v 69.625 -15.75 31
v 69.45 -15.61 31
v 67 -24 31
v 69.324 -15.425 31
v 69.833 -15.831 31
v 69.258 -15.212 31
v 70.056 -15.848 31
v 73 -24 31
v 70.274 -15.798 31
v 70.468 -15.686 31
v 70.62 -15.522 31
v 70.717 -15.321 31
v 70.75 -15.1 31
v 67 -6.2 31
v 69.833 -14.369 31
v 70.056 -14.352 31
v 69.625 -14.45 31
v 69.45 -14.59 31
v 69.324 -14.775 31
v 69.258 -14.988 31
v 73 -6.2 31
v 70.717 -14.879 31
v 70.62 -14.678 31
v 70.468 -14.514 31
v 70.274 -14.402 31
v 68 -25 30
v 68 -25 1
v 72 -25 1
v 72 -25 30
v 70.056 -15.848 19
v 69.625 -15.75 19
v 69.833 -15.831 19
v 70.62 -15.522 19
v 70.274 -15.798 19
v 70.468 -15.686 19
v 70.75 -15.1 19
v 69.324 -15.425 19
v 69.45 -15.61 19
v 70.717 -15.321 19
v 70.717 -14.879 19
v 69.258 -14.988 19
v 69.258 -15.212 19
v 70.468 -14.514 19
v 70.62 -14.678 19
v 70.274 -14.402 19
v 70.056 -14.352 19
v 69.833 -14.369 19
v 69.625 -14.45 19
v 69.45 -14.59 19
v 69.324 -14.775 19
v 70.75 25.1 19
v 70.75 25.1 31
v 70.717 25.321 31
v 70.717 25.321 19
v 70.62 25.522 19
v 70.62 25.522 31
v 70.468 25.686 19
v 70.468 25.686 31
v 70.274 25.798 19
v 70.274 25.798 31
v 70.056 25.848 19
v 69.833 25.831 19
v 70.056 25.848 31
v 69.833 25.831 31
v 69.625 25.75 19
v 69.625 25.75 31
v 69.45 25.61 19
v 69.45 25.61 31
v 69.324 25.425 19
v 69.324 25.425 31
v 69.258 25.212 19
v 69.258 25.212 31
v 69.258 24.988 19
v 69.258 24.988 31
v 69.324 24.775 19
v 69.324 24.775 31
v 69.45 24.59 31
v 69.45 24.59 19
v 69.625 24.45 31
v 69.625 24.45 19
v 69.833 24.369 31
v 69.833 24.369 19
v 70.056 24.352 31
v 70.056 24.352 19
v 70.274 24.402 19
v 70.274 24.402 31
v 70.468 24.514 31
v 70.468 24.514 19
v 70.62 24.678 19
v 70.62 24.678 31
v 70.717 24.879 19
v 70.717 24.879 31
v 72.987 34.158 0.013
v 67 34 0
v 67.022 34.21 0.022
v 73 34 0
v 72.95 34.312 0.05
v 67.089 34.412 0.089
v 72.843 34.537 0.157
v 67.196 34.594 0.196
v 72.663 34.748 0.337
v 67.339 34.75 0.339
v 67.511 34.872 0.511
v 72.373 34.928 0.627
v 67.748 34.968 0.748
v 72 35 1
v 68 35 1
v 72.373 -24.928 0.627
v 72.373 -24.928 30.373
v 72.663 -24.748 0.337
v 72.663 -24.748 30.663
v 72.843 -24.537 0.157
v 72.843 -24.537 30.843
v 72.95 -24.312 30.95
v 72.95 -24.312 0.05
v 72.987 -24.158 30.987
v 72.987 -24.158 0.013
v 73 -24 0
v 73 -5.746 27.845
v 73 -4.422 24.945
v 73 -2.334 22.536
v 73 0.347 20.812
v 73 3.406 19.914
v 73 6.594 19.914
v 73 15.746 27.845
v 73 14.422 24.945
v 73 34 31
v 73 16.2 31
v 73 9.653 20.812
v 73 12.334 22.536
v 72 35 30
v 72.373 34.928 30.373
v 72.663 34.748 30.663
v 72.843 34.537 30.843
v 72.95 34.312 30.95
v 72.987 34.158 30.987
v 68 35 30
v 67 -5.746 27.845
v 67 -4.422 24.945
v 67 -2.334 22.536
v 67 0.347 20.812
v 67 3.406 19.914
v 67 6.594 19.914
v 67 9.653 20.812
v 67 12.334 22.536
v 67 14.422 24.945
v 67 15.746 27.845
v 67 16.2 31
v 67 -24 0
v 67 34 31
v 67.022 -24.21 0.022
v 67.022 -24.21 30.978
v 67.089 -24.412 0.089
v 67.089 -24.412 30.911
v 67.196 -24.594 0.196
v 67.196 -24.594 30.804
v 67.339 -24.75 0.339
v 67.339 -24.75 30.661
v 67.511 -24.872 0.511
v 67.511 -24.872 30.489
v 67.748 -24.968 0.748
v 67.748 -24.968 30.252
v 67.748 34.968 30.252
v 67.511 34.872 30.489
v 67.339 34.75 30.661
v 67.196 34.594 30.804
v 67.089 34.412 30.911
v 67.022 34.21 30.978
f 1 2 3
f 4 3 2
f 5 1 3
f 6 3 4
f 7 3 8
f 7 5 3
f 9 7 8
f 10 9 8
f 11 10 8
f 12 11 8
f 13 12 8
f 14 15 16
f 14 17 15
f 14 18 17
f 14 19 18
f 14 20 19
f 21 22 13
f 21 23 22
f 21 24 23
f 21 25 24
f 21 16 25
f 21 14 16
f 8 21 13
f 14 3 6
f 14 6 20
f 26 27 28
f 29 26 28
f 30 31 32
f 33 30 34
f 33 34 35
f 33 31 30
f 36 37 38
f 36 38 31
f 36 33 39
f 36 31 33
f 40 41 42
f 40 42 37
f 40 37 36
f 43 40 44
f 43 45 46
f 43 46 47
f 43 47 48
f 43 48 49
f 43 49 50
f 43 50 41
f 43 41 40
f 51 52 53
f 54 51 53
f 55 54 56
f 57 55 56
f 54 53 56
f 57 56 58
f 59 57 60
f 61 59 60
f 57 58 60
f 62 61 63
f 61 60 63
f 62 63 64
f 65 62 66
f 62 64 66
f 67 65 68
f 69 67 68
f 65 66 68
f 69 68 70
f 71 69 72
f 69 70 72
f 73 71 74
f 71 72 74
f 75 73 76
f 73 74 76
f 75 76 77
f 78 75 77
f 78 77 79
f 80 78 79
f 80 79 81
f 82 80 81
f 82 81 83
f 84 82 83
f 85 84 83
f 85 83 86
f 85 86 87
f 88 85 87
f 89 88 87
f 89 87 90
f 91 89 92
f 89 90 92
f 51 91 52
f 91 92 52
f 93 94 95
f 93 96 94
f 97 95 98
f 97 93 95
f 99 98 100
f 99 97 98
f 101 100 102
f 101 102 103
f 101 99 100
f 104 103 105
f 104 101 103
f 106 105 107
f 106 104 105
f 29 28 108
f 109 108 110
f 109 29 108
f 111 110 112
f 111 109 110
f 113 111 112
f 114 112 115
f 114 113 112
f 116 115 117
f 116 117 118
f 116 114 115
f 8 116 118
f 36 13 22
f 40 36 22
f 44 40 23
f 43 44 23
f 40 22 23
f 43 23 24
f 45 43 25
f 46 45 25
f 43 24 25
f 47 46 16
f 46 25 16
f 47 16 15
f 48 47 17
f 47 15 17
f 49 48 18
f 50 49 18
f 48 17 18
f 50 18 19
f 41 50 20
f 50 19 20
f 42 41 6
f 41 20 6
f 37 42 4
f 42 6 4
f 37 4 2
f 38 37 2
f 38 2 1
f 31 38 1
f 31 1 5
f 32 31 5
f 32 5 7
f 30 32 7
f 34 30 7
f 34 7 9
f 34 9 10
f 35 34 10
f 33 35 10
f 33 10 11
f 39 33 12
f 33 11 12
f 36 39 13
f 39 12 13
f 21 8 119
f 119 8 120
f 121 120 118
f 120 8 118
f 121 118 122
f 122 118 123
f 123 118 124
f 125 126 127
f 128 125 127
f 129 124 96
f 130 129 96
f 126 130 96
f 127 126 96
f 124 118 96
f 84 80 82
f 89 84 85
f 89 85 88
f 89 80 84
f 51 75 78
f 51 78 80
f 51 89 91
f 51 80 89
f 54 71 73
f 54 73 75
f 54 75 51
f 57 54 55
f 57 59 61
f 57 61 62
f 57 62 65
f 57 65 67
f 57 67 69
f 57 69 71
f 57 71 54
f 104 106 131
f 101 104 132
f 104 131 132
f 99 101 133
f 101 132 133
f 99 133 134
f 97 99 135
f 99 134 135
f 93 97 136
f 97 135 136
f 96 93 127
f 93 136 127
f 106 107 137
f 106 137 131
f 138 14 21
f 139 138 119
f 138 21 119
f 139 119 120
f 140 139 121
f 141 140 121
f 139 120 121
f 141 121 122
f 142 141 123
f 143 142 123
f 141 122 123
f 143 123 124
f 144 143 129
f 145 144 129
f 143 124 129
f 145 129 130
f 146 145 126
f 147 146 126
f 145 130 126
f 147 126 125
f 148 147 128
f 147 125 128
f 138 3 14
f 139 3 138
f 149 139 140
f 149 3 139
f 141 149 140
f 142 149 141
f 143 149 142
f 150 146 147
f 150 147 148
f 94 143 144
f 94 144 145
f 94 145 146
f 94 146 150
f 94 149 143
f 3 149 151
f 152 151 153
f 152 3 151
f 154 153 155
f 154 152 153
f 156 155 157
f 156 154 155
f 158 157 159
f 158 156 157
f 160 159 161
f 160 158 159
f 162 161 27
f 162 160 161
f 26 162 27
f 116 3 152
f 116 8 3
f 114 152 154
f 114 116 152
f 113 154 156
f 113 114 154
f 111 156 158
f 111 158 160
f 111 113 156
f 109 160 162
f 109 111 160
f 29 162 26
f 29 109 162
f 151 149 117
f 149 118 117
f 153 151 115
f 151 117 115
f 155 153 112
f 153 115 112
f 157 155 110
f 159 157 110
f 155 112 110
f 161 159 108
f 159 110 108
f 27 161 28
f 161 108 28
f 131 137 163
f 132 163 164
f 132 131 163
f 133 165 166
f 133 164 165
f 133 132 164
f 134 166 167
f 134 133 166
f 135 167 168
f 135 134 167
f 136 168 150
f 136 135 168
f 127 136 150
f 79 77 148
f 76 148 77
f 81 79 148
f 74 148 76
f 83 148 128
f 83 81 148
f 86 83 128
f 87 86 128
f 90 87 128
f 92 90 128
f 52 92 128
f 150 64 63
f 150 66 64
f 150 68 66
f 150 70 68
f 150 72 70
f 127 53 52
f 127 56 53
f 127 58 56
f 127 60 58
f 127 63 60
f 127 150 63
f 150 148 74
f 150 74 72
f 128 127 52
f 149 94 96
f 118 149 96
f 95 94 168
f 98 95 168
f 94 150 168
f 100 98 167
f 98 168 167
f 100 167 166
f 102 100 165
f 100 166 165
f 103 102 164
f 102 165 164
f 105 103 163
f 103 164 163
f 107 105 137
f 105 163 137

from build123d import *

# Parameters (mm, degrees)
SKETCH020_W     = 6
SKETCH020_H     = 60
PAD004_DEPTH    = 31
SKETCH021_R     = 11.2
POCKET_DEPTH    = 6.001
FILLET004_R     = 1
SKETCH027_R     = 0.75
POCKET009_DEPTH = 12


with BuildPart() as part:
    # Sketch020 → Pad004 (new body)
    with BuildSketch(Plane.XY):
        with Locations((70, 5)):
            Rectangle(SKETCH020_W, SKETCH020_H)
    extrude(amount=PAD004_DEPTH)

    # Sketch021 → Pocket (cut, through all)
    with BuildSketch(Plane.YZ.offset(73)):
        with Locations((5, 31)):
            Circle(SKETCH021_R)
    extrude(amount=-POCKET_DEPTH, mode=Mode.SUBTRACT)

    # Fillet004
    fillet004_edges = [part.edges().sort_by_distance(p)[0] for p in [
        (73, -25, 15.5),
        (67, -25, 15.5),
        (70, -25, 0),
        (70, -25, 31),
        (67, 35, 15.5),
        (73, 35, 15.5),
        (70, 35, 0),
        (70, 35, 31),
    ]]
    fillet(fillet004_edges, radius=FILLET004_R)

    # Sketch027 → Pocket009 (cut)
    with BuildSketch(Plane.XY.offset(31)):
        with Locations((70, 25.1)):
            Circle(SKETCH027_R)
        with Locations((70, -15.1)):
            Circle(SKETCH027_R)
    extrude(amount=-POCKET009_DEPTH, mode=Mode.SUBTRACT)


solid = part.part
